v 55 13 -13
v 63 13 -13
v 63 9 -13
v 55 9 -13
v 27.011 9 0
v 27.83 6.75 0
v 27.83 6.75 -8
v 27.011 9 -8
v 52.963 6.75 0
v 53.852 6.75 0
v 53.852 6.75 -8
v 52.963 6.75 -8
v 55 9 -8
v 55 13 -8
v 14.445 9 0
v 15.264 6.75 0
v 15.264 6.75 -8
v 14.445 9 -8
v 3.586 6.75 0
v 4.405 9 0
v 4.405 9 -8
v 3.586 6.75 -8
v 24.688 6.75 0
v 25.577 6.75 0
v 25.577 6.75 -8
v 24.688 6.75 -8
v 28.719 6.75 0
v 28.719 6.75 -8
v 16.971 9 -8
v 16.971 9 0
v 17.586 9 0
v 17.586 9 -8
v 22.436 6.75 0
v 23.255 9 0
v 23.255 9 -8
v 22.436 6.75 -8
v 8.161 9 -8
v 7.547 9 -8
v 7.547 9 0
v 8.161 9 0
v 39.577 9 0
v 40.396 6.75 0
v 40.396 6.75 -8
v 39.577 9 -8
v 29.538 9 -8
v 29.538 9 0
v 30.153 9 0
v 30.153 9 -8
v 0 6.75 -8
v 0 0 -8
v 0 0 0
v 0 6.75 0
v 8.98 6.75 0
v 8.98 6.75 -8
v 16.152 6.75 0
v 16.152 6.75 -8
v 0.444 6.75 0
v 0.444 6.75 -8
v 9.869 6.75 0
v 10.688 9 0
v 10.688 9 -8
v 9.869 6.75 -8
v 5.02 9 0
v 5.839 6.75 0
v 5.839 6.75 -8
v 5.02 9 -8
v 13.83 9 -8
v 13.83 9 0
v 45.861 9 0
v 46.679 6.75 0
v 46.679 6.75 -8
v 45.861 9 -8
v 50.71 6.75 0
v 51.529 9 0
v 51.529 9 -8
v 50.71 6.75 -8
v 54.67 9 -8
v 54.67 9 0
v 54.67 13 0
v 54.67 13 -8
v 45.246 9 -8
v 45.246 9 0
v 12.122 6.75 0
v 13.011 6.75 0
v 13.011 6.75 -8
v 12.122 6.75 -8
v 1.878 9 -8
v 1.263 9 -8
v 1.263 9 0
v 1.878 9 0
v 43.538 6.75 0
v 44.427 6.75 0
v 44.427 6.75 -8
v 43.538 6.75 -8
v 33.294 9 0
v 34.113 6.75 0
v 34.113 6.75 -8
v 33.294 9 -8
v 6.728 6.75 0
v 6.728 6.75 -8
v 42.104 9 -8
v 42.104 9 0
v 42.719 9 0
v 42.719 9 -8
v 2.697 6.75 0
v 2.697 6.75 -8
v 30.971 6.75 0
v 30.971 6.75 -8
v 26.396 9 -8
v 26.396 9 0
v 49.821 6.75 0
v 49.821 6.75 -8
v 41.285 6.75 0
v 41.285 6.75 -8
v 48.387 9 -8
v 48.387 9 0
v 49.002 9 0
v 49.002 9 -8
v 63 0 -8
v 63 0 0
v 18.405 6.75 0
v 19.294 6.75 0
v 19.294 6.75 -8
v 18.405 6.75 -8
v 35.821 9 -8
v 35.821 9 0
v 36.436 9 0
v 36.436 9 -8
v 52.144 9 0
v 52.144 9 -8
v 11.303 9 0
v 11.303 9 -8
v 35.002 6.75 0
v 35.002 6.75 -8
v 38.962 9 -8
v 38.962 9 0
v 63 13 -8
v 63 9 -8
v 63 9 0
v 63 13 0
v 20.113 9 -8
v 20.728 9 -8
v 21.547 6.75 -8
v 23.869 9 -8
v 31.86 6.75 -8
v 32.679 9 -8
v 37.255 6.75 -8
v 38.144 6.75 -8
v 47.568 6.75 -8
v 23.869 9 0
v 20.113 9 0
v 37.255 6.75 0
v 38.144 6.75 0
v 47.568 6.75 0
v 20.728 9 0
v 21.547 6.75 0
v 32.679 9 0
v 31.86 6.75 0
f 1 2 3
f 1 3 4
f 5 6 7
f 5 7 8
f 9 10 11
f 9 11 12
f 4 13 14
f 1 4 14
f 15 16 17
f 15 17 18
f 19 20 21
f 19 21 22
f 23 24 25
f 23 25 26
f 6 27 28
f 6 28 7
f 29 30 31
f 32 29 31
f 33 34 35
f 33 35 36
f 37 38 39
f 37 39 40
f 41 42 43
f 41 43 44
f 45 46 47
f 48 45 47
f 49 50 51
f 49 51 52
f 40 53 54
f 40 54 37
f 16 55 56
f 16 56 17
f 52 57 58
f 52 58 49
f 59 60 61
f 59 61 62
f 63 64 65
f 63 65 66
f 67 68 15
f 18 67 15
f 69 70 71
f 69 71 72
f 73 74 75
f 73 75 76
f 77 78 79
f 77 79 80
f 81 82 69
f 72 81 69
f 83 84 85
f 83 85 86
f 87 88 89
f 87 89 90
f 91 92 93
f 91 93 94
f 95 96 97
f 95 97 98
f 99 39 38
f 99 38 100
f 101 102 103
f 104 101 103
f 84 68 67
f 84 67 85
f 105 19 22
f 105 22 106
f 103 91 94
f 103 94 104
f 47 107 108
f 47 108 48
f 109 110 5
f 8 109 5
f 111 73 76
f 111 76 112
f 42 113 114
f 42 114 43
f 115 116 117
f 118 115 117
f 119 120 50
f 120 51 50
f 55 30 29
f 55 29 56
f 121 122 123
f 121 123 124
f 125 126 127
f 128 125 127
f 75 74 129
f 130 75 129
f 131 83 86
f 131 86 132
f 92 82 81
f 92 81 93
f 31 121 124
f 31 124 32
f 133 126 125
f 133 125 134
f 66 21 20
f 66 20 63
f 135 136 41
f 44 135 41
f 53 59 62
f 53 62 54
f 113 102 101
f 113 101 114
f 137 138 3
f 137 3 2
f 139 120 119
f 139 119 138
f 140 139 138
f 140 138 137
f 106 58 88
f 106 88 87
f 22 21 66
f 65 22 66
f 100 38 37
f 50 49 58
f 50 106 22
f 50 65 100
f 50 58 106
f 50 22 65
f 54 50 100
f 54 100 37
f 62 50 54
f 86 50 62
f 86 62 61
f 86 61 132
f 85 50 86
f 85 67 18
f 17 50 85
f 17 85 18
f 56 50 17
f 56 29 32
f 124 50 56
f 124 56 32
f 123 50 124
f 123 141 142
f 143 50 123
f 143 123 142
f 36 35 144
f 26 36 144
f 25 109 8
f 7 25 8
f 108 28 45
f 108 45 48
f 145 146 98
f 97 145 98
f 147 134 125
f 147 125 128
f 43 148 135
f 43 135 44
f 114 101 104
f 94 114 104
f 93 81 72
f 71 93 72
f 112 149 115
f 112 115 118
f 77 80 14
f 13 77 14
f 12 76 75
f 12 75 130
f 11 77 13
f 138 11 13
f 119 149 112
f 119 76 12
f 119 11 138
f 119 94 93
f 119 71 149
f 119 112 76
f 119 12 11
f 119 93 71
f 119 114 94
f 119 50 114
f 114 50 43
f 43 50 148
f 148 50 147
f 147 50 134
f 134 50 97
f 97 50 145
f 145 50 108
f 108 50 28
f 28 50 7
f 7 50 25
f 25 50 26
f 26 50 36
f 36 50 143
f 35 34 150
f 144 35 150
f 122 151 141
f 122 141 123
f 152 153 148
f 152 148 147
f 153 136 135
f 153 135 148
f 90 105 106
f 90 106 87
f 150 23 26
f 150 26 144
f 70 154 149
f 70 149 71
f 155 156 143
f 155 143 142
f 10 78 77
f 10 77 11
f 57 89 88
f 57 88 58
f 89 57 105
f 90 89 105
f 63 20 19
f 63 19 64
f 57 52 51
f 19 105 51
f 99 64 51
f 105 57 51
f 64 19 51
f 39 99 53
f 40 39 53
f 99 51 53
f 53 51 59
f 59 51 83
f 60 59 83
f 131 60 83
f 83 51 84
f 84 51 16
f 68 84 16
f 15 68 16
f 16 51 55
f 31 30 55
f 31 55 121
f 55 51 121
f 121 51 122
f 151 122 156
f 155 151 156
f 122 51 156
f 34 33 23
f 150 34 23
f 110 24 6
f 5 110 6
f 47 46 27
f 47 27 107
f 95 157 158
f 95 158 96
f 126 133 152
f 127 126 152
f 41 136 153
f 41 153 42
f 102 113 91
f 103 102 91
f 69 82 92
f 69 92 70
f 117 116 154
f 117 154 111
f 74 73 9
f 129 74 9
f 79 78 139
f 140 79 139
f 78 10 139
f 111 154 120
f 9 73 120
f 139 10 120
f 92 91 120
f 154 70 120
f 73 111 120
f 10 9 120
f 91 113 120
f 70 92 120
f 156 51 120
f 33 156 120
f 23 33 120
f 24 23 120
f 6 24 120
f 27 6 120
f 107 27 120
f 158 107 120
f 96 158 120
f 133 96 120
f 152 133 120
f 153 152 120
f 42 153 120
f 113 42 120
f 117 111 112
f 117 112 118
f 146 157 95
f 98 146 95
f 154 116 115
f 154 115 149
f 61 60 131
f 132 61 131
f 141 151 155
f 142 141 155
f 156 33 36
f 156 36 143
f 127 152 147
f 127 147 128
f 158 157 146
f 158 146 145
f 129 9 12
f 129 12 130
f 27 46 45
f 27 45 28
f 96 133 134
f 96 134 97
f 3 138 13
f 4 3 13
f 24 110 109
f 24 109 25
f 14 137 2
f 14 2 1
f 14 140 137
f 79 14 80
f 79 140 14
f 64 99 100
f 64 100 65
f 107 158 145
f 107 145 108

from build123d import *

# Parameters (mm, degrees)
BLANKSKE_W          = 55
BLANKSKE_H          = 9
BLANK_DEPTH         = 8
TOOTHCUTSIM_DEPTH   = 57.302753041
TEETHCUTS_COUNT     = 18
TEETHCUTS_PITCH     = 3.14159265
SKETCH1_W           = 8
SKETCH1_H           = 9
BOSS_EXTRUDE1_DEPTH = 8
SKETCH2_W           = 8.329556553
SKETCH2_H           = 8
BOSS_EXTRUDE2_DEPTH = 4
SKETCH3_W           = 8
SKETCH3_H           = 4
BOSS_EXTRUDE3_DEPTH = 5


with BuildPart() as part:
    # BlankSke → Blank (new body)
    with BuildSketch(Plane.XY):
        with Locations((27.5, 4.5)):
            Rectangle(BLANKSKE_W, BLANKSKE_H)
    extrude(amount=-BLANK_DEPTH)

    # TooCutSkeSim → ToothCutSim (cut, through all)
    with BuildSketch(Plane.XY):
        Polygon((0.44443537, 6.75), (-0.44443537, 6.75), (-1.272613241, 9.0254), (1.272613241, 9.0254), align=None)
    toothcutsim = extrude(amount=-TOOTHCUTSIM_DEPTH, mode=Mode.SUBTRACT)

    # TeethCuts: ToothCutSim ×18
    with Locations(*[(i * TEETHCUTS_PITCH, 0, 0) for i in range(1, TEETHCUTS_COUNT)]):
        add(toothcutsim, mode=Mode.SUBTRACT)

    # Sketch1 → Boss-Extrude1 (add)
    with BuildSketch(Plane(origin=(55, 0, 0), x_dir=(0, 0, -1), z_dir=(1, 0, 0))):
        with Locations((4, 4.5)):
            Rectangle(SKETCH1_W, SKETCH1_H)
    extrude(amount=BOSS_EXTRUDE1_DEPTH)

    # Sketch2 → Boss-Extrude2 (add)
    with BuildSketch(Plane(origin=(0, 9, 0), x_dir=(1, 0, 0), z_dir=(0, 1, 0))):
        with Locations((58.835221724, 4)):
            Rectangle(SKETCH2_W, SKETCH2_H)
    extrude(amount=BOSS_EXTRUDE2_DEPTH)

    # Sketch3 → Boss-Extrude3 (add)
    with BuildSketch(Plane(origin=(0, 0, -8), x_dir=(-1, 0, 0), z_dir=(0, 0, -1))):
        with Locations((-59, 11)):
            Rectangle(SKETCH3_W, SKETCH3_H)
    extrude(amount=BOSS_EXTRUDE3_DEPTH)


solid = part.part
